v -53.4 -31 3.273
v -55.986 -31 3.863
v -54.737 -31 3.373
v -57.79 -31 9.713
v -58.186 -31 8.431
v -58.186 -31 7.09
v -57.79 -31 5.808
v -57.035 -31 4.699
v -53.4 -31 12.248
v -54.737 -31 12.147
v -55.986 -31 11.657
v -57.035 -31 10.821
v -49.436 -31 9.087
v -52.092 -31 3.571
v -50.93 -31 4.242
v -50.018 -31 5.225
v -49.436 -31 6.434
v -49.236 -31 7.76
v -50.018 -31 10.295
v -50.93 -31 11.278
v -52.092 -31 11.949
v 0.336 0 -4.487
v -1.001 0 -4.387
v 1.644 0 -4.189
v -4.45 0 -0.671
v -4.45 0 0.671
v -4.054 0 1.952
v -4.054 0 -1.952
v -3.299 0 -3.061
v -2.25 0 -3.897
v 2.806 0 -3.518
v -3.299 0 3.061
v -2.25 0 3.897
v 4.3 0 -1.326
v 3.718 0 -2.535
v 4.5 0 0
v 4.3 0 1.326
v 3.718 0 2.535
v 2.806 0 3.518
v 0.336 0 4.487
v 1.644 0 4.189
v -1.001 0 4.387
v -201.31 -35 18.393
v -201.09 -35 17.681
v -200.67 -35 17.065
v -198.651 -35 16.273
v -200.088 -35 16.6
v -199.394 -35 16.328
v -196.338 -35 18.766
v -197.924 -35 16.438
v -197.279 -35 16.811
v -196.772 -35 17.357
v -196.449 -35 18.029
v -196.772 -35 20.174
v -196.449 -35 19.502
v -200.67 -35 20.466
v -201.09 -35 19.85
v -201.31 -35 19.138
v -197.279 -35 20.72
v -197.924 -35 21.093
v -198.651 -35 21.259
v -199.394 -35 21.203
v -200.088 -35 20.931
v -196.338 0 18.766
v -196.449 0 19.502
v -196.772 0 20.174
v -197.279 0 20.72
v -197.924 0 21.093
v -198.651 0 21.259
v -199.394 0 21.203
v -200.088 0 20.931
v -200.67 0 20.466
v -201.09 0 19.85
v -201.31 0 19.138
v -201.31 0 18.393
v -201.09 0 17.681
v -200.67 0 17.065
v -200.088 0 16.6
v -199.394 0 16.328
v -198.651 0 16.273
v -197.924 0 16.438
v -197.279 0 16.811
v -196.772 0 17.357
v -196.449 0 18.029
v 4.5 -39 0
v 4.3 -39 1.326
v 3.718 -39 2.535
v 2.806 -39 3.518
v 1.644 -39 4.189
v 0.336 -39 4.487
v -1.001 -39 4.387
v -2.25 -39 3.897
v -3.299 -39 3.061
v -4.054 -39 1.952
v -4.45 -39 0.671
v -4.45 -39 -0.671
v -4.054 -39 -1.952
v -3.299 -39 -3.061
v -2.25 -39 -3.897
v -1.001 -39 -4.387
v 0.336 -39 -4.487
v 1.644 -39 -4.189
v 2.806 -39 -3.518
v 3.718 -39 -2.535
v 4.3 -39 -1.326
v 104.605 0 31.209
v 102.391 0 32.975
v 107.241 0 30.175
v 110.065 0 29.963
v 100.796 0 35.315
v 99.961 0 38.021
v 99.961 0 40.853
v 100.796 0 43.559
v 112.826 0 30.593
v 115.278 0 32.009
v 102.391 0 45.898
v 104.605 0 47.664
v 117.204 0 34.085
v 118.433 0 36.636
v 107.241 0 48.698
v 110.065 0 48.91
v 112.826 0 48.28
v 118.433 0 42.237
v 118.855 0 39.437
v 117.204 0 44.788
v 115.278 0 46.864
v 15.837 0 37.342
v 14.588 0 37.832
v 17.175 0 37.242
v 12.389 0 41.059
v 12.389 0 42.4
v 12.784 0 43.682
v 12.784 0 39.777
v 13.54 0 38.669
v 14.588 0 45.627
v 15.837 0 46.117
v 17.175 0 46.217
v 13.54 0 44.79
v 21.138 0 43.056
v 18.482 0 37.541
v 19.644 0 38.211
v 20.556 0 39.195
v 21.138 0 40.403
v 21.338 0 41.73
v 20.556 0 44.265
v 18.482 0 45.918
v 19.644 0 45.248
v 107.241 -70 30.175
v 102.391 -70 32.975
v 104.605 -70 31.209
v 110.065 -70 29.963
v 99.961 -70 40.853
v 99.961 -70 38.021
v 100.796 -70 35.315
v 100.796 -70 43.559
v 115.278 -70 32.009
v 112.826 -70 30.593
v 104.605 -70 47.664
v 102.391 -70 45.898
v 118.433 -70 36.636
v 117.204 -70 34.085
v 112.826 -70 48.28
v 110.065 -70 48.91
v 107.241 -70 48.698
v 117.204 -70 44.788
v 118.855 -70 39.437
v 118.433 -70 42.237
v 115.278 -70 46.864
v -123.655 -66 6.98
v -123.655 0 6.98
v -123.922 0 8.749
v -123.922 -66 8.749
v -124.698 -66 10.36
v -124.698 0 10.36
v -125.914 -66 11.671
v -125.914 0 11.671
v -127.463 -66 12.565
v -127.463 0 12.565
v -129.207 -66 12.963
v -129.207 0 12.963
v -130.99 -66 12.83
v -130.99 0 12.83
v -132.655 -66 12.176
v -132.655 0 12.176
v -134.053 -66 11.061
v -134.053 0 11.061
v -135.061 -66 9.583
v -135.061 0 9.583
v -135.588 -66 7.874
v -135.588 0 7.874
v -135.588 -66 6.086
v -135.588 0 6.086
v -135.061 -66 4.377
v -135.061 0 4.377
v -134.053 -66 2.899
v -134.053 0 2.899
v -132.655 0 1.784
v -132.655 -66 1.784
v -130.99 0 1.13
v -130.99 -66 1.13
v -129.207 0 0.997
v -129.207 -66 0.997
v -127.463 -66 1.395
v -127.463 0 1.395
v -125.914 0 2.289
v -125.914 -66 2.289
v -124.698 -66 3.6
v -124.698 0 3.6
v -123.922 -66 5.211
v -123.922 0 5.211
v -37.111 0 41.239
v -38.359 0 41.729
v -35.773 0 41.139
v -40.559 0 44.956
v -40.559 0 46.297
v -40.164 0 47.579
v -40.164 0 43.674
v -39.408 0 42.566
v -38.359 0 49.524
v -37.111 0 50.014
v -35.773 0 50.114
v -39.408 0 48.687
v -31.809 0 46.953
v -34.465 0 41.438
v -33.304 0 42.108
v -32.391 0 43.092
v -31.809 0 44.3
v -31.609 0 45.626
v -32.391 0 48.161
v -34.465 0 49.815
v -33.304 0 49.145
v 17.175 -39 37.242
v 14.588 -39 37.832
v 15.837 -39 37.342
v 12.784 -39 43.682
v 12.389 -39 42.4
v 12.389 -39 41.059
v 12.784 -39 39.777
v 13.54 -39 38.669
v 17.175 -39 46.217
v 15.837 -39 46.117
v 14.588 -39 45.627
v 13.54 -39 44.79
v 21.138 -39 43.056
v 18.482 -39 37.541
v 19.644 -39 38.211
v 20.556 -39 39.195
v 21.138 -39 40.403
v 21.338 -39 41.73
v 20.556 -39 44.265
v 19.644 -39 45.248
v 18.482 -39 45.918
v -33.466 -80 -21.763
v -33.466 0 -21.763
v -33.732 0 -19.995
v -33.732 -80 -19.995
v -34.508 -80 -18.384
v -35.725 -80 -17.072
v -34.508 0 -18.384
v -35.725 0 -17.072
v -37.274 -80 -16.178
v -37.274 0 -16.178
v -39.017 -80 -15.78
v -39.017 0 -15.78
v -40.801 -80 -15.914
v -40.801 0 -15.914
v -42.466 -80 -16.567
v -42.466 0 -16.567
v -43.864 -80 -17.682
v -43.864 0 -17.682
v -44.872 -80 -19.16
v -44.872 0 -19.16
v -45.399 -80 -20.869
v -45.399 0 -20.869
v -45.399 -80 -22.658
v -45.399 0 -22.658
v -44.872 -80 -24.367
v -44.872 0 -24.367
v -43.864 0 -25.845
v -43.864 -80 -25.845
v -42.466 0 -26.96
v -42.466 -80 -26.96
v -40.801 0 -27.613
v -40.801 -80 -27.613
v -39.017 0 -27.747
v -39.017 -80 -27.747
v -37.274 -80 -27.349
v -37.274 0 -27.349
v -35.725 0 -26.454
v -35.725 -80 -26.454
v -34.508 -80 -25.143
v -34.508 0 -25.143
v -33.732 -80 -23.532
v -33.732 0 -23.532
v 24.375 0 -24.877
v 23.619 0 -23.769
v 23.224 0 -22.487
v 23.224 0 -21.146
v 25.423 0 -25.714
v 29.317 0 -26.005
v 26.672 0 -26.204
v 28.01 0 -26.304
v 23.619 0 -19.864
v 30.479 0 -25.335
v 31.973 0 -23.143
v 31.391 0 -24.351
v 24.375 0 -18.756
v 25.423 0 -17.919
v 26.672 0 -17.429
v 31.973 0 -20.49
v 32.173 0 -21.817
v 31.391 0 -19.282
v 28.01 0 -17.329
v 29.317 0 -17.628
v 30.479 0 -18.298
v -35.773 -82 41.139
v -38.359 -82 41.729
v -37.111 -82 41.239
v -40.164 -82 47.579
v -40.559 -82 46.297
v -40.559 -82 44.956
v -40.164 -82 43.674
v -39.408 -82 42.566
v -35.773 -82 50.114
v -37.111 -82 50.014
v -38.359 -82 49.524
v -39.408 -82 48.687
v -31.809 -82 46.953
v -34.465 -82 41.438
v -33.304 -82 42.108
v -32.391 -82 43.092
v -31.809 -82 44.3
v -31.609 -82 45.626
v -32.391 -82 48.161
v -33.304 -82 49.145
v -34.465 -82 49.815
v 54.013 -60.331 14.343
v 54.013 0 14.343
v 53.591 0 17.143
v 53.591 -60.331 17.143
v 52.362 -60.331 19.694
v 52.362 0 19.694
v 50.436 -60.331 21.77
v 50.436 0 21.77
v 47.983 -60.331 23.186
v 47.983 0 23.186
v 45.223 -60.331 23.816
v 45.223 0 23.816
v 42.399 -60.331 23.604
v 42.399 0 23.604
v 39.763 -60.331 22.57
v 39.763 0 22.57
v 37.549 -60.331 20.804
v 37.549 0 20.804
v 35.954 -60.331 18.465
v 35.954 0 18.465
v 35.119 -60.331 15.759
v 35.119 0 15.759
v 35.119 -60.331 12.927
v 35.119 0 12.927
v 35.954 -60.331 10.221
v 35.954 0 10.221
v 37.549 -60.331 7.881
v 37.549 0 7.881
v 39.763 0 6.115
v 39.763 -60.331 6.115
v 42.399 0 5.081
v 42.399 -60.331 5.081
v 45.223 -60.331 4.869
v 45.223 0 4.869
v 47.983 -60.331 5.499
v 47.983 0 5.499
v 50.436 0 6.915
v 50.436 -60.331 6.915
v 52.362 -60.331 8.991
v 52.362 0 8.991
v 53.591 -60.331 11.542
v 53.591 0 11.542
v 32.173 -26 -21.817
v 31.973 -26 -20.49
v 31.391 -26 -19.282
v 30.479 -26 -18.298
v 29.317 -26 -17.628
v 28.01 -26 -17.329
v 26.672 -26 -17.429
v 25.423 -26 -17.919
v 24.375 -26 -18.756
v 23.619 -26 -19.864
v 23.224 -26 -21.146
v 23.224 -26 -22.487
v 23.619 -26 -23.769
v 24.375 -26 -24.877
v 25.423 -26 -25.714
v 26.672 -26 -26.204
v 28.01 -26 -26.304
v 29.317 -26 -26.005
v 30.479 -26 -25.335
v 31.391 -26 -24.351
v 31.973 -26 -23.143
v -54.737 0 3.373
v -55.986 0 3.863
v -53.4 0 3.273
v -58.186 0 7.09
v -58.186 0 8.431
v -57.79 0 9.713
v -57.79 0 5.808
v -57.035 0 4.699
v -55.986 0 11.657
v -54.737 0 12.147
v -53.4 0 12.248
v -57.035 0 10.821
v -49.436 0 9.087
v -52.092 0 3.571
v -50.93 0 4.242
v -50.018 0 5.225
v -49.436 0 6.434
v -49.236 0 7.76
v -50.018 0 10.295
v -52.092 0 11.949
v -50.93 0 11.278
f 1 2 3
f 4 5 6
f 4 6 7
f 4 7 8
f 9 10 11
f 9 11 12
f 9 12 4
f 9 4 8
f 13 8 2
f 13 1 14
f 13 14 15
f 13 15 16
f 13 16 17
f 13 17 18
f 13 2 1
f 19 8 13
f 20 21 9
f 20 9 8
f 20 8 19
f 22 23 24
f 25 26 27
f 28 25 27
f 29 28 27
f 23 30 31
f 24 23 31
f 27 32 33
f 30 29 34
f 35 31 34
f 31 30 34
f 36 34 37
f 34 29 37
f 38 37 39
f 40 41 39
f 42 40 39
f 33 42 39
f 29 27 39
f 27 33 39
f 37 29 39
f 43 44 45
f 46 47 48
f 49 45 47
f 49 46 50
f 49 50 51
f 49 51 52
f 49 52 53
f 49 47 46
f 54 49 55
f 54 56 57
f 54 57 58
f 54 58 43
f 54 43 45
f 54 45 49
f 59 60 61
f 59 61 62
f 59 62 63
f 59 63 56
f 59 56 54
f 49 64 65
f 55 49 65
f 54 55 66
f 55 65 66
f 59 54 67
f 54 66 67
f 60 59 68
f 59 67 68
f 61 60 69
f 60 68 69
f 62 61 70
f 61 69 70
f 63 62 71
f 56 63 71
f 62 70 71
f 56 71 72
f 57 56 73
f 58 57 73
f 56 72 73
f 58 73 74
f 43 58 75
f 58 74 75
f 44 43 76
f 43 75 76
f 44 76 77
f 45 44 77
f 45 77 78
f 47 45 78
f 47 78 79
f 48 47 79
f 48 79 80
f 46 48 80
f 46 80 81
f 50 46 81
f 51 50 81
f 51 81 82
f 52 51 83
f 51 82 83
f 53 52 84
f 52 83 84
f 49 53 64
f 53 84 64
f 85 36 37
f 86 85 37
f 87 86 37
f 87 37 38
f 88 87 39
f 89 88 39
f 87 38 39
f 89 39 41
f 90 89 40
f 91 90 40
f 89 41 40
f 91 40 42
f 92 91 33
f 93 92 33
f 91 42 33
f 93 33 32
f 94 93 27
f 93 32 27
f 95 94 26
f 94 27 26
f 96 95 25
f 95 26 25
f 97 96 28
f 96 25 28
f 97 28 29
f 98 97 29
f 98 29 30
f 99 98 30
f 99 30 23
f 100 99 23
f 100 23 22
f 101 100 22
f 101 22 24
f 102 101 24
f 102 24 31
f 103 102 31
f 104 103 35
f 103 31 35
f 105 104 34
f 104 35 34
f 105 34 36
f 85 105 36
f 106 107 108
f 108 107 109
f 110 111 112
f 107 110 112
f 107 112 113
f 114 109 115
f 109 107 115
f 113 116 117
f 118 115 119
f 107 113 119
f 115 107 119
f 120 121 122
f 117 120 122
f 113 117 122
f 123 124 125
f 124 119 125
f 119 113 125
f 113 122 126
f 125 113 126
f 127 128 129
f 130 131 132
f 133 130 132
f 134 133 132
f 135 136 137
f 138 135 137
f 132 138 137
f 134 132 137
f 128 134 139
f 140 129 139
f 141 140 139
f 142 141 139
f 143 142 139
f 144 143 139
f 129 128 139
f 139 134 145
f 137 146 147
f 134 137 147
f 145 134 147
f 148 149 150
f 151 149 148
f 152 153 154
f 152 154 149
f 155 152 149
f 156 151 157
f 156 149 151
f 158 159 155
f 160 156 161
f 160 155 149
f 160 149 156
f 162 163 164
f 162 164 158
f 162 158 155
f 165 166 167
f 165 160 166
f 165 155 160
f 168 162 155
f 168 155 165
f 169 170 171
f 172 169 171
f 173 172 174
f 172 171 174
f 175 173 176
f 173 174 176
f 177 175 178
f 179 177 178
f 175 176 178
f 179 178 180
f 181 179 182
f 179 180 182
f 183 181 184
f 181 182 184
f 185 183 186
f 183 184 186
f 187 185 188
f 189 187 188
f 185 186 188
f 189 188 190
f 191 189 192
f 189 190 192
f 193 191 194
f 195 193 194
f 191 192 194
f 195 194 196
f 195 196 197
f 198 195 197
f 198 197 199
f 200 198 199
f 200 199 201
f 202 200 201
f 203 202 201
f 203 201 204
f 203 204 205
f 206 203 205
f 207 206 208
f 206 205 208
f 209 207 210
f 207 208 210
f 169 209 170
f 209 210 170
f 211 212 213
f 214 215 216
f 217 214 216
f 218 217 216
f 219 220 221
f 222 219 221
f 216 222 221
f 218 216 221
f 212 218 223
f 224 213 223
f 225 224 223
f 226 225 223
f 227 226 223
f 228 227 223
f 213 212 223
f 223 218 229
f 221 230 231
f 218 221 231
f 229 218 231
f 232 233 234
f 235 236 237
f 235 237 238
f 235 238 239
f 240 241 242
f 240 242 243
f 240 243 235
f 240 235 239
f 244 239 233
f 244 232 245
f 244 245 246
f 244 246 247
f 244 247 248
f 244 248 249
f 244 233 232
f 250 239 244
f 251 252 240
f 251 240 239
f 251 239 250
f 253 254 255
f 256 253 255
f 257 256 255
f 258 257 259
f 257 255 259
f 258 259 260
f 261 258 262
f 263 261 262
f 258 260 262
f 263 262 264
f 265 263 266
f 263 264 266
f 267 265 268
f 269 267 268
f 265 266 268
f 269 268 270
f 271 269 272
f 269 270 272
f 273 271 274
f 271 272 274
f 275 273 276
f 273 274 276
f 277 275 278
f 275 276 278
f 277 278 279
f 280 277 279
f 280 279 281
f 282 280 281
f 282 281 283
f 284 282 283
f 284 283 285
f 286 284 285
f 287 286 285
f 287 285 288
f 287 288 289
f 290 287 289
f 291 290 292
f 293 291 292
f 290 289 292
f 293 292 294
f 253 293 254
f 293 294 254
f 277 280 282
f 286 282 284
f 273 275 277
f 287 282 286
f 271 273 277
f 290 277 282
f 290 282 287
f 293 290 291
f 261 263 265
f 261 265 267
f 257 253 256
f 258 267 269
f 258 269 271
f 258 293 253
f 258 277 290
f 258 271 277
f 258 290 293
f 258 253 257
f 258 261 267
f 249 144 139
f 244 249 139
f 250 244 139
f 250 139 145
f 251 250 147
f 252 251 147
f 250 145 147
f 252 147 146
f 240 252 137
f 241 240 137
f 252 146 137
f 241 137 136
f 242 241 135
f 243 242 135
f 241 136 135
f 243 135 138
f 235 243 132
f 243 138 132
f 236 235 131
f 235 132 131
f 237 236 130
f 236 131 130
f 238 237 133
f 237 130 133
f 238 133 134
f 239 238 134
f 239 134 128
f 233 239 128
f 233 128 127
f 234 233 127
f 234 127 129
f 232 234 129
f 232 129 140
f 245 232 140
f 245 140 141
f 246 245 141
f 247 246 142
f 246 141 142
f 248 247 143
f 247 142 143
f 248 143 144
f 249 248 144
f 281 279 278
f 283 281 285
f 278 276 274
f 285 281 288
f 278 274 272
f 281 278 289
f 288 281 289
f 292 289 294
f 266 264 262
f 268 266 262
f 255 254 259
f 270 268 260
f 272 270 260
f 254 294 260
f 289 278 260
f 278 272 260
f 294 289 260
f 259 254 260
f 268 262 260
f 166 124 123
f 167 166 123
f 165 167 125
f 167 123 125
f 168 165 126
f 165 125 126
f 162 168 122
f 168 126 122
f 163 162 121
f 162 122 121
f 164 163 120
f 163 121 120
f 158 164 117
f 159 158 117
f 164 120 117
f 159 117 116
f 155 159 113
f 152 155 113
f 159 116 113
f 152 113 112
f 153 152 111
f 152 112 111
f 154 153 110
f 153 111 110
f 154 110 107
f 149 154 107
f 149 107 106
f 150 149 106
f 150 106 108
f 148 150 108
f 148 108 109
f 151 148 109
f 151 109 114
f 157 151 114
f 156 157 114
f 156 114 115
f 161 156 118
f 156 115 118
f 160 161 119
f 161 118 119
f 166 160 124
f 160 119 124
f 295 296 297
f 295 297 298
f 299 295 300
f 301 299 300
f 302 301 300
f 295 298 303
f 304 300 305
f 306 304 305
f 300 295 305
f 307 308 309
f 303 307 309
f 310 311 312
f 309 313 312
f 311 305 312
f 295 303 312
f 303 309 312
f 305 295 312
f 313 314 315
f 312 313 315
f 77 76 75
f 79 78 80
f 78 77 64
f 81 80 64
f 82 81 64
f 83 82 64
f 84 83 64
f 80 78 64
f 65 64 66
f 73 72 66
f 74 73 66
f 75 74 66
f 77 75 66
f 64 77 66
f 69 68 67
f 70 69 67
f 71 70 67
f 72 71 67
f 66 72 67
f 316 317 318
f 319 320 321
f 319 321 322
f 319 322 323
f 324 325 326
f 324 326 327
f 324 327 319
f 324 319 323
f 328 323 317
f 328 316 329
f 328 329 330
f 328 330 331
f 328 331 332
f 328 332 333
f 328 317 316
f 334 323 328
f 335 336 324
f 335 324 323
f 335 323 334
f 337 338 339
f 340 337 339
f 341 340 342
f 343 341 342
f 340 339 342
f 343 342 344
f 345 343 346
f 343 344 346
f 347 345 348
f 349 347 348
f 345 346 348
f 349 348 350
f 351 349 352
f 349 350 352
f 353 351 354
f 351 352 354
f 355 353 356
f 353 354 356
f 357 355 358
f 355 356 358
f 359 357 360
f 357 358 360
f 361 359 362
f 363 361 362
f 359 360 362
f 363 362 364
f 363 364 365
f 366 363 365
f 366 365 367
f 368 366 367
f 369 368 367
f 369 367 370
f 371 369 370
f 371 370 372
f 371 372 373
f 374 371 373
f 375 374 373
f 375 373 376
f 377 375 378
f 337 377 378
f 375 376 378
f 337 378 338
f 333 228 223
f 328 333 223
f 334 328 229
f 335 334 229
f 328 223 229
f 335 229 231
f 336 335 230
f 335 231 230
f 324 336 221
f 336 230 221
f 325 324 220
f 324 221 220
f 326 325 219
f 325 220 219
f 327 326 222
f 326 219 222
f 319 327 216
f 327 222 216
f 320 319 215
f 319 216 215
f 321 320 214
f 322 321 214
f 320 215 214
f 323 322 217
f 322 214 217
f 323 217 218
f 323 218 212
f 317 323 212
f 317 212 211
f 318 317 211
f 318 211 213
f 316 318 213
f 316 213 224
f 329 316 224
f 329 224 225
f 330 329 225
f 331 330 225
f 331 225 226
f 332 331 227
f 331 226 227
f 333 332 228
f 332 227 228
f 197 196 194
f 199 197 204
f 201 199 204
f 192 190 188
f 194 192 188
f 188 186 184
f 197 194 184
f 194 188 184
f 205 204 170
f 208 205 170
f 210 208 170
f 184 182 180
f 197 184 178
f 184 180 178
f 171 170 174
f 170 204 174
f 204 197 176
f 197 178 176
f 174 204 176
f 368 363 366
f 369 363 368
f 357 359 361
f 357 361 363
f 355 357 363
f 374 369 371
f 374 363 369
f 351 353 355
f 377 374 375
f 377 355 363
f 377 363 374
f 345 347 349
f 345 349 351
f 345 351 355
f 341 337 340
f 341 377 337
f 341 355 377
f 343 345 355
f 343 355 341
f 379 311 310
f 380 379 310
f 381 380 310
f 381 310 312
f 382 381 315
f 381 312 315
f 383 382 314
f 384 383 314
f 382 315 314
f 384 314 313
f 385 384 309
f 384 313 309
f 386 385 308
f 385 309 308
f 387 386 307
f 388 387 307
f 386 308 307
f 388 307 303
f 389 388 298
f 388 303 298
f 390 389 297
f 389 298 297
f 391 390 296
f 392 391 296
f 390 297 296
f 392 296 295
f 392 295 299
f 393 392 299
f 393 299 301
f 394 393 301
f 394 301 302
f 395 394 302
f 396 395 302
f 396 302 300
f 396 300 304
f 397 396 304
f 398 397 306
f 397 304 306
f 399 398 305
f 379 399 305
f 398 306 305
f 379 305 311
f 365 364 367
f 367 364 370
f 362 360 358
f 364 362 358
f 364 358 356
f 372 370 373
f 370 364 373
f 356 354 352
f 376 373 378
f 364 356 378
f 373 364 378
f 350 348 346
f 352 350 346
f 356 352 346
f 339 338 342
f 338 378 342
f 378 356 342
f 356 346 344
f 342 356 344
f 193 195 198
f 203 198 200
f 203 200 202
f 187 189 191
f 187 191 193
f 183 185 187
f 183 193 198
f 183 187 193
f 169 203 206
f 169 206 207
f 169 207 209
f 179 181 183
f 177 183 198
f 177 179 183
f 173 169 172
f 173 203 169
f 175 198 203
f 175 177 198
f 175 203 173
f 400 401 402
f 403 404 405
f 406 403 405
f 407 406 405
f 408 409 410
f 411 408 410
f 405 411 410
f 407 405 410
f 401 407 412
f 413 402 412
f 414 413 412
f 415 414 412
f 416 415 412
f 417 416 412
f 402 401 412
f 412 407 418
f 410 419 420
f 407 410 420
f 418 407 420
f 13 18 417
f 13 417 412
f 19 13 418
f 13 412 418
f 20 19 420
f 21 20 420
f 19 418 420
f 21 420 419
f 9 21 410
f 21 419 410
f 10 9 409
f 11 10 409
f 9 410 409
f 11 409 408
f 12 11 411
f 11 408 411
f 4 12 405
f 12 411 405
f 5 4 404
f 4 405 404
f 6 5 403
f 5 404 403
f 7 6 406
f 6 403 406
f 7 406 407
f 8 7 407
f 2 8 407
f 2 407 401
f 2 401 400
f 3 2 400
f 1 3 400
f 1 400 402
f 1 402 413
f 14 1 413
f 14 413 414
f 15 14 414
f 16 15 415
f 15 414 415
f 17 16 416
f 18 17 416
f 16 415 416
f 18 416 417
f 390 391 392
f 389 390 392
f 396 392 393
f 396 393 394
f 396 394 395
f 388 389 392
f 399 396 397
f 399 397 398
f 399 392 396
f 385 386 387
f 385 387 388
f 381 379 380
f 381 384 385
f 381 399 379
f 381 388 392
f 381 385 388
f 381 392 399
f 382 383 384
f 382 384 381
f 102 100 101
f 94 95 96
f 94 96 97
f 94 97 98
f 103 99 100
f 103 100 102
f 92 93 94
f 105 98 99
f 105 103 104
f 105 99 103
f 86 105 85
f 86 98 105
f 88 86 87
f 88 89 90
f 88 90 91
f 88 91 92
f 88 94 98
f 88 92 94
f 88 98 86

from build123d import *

# Parameters (mm, degrees)
F0_R      = 4.5
F1_DEPTH  = 39
F2_R      = 4.5
F3_DEPTH  = 82
F4_R      = 9.5
F5_DEPTH  = 60.331
F6_R      = 4.5
F7_DEPTH  = 31
F8_R      = 6
F9_DEPTH  = 80
F10_R     = 4.5
F11_DEPTH = 26
F12_R     = 4.5
F13_DEPTH = 39
F14_R     = 9.5
F15_DEPTH = 70
F16_R     = 6
F17_DEPTH = 66
F18_R     = 2.5
F19_DEPTH = 35


with BuildPart() as f1:
    # F0 (on Front) → F1 (new body)
    with BuildSketch(Plane.XZ):
        Circle(F0_R)
    extrude(amount=F1_DEPTH)


with BuildPart() as f3:
    # F2 (on Front) → F3 (new body)
    with BuildSketch(Plane.XZ):
        with Locations((-36.109302, 45.626484)):
            Circle(F2_R)
    extrude(amount=F3_DEPTH)


with BuildPart() as f5:
    # F4 (on Front) → F5 (new body)
    with BuildSketch(Plane.XZ):
        with Locations((44.512715, 14.342608)):
            Circle(F4_R)
    extrude(amount=F5_DEPTH)


with BuildPart() as f7:
    # F6 (on Front) → F7 (new body)
    with BuildSketch(Plane.XZ):
        with Locations((-53.735971, 7.760233)):
            Circle(F6_R)
    extrude(amount=F7_DEPTH)


with BuildPart() as f9:
    # F8 (on Front) → F9 (new body)
    with BuildSketch(Plane.XZ):
        with Locations((-39.465845, -21.763485)):
            Circle(F8_R)
    extrude(amount=F9_DEPTH)


with BuildPart() as f11:
    # F10 (on Front) → F11 (new body)
    with BuildSketch(Plane.XZ):
        with Locations((27.673289, -21.816513)):
            Circle(F10_R)
    extrude(amount=F11_DEPTH)


with BuildPart() as f13:
    # F12 (on Front) → F13 (new body)
    with BuildSketch(Plane.XZ):
        with Locations((16.838241, 41.729562)):
            Circle(F12_R)
    extrude(amount=F13_DEPTH)


with BuildPart() as f15:
    # F14 (on Front) → F15 (new body)
    with BuildSketch(Plane.XZ):
        with Locations((109.354839, 39.436627)):
            Circle(F14_R)
    extrude(amount=F15_DEPTH)


with BuildPart() as f17:
    # F16 (on Front) → F17 (new body)
    with BuildSketch(Plane.XZ):
        with Locations((-129.655063, 6.98001)):
            Circle(F16_R)
    extrude(amount=F17_DEPTH)


with BuildPart() as f19:
    # F18 (on Front) → F19 (new body)
    with BuildSketch(Plane.XZ):
        with Locations((-198.837802, 18.765518)):
            Circle(F18_R)
    extrude(amount=F19_DEPTH)


solid = Compound([f1.part, f3.part, f5.part, f7.part, f9.part, f11.part, f13.part, f15.part, f17.part, f19.part])
